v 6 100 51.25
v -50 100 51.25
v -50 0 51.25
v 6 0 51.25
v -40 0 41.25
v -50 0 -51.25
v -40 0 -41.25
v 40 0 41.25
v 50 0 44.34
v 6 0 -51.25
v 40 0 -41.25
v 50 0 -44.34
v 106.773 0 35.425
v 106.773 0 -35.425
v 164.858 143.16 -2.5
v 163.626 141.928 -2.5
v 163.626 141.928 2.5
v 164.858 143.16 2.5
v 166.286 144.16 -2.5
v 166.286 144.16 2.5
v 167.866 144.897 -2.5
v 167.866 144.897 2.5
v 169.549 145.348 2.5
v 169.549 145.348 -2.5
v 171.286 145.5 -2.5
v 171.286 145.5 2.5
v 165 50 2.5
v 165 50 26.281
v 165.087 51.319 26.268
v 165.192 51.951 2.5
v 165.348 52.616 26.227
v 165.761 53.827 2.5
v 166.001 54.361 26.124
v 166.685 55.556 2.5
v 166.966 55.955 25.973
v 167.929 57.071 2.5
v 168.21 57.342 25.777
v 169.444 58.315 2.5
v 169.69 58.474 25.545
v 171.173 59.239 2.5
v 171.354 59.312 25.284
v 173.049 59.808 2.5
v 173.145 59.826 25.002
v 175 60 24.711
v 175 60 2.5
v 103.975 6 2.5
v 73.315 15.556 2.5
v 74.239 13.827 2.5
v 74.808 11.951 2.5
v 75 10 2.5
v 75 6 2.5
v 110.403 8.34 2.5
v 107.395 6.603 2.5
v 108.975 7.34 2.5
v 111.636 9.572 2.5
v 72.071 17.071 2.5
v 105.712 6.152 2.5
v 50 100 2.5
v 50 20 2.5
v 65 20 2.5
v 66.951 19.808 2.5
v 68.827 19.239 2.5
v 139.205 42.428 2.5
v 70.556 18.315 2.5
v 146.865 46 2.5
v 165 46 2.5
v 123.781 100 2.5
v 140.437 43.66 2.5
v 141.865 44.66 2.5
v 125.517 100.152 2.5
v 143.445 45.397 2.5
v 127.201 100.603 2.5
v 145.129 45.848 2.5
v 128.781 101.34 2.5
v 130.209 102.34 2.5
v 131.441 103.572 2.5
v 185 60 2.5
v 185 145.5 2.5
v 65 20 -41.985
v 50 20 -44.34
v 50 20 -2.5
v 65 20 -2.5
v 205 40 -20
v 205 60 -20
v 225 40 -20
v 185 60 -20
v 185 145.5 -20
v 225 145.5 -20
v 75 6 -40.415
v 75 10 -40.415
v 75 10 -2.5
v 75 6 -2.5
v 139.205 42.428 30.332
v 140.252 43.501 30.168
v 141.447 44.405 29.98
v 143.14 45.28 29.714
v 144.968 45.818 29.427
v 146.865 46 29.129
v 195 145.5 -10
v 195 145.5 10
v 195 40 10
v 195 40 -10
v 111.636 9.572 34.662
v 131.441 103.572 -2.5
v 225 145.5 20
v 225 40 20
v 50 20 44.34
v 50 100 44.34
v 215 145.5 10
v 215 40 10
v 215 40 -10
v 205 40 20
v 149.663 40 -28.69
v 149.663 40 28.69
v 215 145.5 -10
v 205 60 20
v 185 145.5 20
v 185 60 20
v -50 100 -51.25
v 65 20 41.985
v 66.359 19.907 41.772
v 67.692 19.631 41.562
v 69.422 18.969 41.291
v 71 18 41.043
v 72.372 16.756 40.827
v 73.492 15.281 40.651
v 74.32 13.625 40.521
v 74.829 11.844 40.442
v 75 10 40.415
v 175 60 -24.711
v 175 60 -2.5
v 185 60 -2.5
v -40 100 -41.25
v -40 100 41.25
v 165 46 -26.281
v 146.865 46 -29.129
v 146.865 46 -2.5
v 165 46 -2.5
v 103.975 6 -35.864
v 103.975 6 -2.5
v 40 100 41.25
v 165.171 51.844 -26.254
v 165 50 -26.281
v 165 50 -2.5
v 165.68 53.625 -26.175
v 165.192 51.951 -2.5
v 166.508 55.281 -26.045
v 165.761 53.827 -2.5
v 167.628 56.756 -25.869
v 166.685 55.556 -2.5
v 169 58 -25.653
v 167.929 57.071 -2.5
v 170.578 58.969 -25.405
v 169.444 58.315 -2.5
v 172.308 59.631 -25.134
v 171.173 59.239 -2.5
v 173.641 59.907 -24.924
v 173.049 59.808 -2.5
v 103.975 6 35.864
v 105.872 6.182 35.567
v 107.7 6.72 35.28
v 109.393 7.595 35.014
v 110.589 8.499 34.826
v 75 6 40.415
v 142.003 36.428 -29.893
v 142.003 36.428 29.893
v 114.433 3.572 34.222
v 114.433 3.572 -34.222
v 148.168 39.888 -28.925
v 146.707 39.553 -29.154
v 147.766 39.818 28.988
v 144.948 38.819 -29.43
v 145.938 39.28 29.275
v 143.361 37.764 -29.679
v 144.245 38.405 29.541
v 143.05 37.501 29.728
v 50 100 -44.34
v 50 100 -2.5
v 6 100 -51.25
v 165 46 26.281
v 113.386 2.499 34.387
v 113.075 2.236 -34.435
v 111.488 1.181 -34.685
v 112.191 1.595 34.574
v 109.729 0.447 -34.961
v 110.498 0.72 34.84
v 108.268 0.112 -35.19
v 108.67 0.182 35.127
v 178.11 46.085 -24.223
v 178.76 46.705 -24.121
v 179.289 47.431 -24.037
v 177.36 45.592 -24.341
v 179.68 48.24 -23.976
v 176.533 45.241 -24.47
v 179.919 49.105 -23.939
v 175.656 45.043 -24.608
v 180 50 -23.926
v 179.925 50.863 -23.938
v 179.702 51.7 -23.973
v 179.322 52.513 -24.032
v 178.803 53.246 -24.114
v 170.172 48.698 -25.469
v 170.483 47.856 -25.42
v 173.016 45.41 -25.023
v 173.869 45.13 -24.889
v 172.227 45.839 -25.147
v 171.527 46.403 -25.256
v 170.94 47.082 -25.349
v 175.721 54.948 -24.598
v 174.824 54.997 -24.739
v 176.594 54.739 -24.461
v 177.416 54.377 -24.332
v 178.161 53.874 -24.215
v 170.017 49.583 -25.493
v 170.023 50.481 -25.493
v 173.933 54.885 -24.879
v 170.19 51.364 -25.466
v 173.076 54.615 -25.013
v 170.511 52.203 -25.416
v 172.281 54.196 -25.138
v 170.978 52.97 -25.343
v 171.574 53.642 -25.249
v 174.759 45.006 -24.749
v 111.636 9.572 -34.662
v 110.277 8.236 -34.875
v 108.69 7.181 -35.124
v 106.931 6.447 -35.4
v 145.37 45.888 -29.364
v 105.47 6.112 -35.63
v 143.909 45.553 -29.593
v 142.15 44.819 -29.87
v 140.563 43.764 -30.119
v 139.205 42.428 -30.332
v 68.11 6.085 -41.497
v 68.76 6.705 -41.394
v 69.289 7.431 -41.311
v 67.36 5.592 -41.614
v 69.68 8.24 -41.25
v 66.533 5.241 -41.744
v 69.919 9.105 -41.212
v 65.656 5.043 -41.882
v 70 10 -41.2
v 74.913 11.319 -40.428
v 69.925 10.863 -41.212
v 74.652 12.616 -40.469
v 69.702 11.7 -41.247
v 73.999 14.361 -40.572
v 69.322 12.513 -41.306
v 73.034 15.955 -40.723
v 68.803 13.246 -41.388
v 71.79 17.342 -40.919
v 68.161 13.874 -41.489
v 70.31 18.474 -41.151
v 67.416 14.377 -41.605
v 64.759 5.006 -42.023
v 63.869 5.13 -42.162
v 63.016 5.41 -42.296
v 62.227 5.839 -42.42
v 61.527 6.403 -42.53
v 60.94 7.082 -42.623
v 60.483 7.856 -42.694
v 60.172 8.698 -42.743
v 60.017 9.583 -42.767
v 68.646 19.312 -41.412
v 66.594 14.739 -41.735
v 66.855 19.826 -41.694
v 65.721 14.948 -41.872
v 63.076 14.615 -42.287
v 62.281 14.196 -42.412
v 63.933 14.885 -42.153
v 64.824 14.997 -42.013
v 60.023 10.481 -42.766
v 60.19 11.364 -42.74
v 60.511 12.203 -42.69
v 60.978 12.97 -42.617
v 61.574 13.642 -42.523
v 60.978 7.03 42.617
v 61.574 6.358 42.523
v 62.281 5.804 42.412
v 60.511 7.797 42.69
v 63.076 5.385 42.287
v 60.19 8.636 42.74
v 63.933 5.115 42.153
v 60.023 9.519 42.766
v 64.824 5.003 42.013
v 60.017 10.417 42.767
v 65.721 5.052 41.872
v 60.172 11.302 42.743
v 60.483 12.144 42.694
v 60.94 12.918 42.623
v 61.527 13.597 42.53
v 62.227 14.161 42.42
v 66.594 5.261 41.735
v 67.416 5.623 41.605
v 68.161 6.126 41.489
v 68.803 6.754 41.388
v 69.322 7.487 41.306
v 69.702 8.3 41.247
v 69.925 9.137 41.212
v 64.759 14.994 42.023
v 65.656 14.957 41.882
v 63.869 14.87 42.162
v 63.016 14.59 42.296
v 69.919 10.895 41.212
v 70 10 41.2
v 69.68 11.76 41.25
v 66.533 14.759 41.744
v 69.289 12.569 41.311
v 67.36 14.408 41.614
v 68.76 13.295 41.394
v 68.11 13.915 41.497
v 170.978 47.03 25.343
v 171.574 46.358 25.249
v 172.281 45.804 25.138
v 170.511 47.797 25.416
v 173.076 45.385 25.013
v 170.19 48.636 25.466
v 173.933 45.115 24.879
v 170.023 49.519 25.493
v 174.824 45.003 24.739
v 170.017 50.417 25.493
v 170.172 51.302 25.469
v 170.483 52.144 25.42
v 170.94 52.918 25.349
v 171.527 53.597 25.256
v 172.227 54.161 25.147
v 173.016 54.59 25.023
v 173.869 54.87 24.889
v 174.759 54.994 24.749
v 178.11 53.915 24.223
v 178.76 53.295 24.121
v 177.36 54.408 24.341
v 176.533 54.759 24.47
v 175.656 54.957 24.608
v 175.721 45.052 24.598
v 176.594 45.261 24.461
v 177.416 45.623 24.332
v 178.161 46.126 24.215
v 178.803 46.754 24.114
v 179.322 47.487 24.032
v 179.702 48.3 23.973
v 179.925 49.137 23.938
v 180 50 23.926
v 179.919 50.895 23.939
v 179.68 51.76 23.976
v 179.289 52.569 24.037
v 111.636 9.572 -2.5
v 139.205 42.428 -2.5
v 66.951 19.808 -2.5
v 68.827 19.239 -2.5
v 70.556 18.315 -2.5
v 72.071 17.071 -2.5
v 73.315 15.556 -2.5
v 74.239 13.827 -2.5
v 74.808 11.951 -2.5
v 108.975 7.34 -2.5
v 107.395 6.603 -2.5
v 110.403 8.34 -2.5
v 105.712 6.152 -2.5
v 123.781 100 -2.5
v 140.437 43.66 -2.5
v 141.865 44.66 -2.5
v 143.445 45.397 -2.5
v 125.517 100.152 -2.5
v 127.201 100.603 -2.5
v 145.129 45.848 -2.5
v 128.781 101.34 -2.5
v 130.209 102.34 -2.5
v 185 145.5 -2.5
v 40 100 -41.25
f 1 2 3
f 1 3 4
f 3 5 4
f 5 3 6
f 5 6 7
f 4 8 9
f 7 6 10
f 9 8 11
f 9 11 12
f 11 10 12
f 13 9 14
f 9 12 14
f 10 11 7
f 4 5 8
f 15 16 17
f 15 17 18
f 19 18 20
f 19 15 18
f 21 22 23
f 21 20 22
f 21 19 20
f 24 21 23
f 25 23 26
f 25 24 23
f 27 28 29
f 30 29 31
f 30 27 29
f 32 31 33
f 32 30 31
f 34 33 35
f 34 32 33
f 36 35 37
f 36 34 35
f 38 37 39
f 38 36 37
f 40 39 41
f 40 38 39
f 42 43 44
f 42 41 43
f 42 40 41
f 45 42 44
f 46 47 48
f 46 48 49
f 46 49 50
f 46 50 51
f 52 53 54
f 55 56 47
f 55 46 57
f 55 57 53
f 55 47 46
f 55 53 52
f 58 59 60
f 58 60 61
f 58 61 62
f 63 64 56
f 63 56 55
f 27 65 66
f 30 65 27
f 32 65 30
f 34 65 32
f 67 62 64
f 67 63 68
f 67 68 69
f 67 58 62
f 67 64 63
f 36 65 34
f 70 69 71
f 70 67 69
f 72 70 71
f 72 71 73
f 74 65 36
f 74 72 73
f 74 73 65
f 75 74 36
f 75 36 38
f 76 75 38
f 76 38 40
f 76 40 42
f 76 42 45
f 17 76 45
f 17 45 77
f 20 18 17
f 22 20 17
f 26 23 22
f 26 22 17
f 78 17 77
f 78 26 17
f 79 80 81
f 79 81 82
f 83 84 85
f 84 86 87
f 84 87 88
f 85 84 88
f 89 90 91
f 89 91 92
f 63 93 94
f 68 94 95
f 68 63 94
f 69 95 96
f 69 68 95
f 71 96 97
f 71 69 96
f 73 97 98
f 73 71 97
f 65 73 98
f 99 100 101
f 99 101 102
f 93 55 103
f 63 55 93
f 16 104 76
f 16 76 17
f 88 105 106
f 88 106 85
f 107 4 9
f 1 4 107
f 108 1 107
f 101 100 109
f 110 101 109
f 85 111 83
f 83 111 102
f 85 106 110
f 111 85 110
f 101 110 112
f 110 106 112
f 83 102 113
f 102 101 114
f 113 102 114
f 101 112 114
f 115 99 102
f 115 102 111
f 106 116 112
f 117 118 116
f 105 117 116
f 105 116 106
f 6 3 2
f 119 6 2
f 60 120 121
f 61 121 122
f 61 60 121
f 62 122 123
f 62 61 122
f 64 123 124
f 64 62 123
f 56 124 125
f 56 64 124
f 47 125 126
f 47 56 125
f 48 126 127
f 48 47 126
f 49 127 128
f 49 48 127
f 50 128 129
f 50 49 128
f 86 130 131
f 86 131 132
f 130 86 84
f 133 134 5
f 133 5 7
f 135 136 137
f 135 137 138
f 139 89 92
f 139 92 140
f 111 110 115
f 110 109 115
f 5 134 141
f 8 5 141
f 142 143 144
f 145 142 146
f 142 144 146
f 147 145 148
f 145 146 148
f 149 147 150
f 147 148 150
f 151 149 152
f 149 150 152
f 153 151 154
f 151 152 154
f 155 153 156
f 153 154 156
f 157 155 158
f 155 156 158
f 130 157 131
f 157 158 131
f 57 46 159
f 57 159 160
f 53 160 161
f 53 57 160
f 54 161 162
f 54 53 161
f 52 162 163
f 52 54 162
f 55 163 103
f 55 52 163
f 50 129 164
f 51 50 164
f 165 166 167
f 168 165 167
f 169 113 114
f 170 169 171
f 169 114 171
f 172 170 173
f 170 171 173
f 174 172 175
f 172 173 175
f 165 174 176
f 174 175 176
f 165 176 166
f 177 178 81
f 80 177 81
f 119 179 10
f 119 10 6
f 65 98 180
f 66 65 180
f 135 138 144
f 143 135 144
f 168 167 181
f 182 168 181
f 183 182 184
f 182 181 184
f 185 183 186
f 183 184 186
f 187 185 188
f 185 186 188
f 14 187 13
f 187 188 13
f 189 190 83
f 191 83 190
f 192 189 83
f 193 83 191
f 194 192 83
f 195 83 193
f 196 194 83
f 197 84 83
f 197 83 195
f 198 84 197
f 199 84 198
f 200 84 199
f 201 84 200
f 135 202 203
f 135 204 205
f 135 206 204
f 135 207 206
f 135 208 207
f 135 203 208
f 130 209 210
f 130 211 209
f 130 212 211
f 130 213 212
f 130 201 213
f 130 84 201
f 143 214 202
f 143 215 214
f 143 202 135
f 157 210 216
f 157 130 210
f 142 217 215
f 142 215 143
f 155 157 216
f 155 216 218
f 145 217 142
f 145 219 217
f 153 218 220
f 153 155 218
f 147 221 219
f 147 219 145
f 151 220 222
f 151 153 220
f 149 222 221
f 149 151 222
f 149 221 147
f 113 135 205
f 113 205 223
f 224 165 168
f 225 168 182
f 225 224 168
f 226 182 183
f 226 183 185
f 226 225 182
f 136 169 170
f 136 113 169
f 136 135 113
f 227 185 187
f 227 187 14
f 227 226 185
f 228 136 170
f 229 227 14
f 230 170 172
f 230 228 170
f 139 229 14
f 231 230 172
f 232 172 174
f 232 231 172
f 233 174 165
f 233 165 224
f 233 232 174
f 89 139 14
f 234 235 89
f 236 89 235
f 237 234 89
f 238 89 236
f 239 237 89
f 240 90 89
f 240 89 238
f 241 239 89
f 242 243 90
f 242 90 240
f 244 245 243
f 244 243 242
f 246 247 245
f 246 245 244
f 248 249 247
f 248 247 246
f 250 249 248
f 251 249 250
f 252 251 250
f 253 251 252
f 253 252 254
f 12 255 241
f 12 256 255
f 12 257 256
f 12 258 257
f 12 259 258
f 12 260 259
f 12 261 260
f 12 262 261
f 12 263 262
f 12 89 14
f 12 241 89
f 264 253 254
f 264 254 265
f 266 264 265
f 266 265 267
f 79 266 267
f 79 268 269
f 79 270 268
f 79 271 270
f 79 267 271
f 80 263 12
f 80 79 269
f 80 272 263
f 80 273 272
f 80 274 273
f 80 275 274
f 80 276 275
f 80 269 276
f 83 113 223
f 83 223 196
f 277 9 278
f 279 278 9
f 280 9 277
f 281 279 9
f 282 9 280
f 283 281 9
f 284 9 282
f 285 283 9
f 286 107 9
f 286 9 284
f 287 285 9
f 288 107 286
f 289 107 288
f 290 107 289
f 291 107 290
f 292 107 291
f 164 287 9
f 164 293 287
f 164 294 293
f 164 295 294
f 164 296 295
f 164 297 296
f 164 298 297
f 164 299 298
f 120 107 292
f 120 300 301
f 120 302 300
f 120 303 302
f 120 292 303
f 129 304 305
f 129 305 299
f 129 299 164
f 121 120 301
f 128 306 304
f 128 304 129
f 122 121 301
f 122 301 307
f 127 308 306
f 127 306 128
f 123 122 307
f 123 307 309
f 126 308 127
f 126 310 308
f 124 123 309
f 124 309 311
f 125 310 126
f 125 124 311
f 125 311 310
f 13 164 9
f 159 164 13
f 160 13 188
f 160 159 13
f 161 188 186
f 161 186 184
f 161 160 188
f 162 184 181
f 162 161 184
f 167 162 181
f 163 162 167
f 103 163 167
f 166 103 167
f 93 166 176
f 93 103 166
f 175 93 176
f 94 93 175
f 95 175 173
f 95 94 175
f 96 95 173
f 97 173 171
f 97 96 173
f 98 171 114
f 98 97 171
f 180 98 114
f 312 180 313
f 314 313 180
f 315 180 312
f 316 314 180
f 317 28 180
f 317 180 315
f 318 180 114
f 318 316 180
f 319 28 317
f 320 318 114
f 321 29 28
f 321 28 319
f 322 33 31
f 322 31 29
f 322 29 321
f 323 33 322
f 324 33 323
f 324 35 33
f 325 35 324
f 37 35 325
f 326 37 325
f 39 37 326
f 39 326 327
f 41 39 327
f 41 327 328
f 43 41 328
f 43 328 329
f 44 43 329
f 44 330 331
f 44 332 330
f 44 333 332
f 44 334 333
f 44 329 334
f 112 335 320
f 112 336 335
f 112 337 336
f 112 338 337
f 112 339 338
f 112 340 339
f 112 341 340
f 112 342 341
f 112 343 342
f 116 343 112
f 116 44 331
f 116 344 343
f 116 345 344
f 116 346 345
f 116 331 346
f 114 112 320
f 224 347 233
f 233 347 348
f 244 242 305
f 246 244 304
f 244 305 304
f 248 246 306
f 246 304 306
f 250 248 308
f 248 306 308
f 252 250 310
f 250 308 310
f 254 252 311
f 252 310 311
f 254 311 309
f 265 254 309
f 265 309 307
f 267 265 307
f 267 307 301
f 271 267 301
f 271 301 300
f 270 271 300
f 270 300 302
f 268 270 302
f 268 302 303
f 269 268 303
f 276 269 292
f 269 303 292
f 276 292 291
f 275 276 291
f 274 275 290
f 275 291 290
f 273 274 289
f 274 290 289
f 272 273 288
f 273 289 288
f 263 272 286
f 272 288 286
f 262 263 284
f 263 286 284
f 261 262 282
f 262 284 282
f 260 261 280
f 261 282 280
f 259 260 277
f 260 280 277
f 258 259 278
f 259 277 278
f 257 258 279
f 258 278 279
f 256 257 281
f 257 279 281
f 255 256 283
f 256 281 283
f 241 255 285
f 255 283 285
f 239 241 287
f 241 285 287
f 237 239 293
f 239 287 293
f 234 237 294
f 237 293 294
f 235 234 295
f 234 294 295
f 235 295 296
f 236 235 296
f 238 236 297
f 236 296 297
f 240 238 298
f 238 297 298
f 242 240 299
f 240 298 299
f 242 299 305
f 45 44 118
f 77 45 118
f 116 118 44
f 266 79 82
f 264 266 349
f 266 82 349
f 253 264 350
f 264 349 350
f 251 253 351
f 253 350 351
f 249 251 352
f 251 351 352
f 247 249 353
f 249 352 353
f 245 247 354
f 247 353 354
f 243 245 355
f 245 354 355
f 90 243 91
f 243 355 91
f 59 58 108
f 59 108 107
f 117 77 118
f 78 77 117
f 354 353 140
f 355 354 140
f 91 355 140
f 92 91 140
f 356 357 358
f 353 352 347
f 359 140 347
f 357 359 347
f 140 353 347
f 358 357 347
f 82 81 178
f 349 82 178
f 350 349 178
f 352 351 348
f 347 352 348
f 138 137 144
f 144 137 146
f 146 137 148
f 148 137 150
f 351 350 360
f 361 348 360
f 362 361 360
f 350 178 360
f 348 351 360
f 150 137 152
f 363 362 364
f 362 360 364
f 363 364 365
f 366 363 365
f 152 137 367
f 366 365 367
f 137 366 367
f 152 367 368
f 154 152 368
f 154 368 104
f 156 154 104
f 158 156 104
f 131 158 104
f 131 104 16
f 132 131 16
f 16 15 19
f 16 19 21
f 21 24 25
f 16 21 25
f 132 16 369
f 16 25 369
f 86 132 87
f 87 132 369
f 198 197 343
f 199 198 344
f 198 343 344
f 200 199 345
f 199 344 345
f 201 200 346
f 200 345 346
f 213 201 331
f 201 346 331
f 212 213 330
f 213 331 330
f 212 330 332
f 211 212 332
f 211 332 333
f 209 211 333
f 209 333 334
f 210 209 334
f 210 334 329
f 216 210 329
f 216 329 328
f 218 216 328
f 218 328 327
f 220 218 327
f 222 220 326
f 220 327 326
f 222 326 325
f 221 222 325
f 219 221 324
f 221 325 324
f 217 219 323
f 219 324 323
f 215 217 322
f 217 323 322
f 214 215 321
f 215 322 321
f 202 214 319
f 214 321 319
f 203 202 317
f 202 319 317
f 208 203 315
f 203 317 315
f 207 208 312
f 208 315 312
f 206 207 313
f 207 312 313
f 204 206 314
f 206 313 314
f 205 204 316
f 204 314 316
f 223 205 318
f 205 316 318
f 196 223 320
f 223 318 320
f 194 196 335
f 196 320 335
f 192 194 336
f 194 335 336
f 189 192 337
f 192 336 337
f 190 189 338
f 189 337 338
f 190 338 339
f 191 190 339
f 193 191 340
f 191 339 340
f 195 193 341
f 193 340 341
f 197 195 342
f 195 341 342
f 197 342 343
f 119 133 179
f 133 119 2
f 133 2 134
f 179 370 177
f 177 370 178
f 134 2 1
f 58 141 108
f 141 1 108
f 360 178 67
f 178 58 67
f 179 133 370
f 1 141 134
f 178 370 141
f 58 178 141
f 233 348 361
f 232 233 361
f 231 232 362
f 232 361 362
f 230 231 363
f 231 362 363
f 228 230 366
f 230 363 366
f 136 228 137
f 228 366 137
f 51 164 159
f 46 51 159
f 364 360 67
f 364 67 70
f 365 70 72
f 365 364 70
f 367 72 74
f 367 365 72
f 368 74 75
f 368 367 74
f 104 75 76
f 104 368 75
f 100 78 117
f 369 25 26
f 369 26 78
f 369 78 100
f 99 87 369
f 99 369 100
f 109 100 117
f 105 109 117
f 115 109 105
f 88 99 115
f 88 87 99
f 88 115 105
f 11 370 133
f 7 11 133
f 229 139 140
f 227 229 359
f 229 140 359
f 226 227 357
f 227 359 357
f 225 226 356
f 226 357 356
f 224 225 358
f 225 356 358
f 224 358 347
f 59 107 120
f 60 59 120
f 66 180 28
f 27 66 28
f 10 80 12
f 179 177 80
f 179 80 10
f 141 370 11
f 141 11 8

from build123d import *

# Parameters (mm, degrees)
ESQUISSE1_W                  = 50
ESQUISSE1_H                  = 100
BOSS_EXTRU_1_DEPTH           = 51.25
ESQUISSE2_W                  = 40
ESQUISSE2_H                  = 40
ESQUISSE2_W_2                = 20
ESQUISSE2_H_2                = 20
BOSS_EXTRU_2_DEPTH           = 45.5
BOSS_EXTRU_2_DEPTH_BACK      = 100
ESQUISSE2_3_W                = 40
ESQUISSE2_3_H                = 82.5
ENL_V_MAT_EXTRU_1_DEPTH      = 101
ENL_V_START                  = -2.5
ENL_V_MAT_EXTRU_3_DEPTH      = 49.75
ENL_V_START_2                = 2.5
ENL_V_MAT_EXTRU_4_DEPTH      = 49.75
ESQUISSE1_6_R                = 5
ENL_V_MAT_EXTRU_5_DEPTH      = 52.25
ENL_V_MAT_EXTRU_5_DEPTH_BACK = 52.25
ENL_V_START_3                = -20
ESQUISSE1_7_W                = 20
ESQUISSE1_7_H                = 85.5
ENL_V_MAT_EXTRU_6_DEPTH      = 31.25
ENL_V_START_4                = 20
ESQUISSE1_8_W                = 20
ESQUISSE1_8_H                = 85.5
ENL_V_MAT_EXTRU_7_DEPTH      = 31.25


with BuildPart() as part:
    # Esquisse1 → Boss.-Extru.1 (new body, symmetric)
    with BuildSketch(Plane.XY):
        with Locations((-25, 50)):
            Rectangle(ESQUISSE1_W, ESQUISSE1_H)
    extrude(amount=BOSS_EXTRU_1_DEPTH, both=True)

    # Esquisse2 → Boss.-Extru.2 (add, two sides)
    with BuildSketch(Plane(origin=(0, 100, 0), x_dir=(1, 0, 0), z_dir=(0, 1, 0))) as boss_extru_2_sk:
        Polygon((205, 20), (50, 44.340452261), (50, -44.340452261), (205, -20), (185, -20), (185, 20), align=None)
        Polygon((6, 51.25), (0, 51.25), (0, 41.25), (40, 41.25), (40, -41.25), (0, -41.25), (0, -51.25), (6, -51.25), (50, -44.340452261), (50, 44.340452261), align=None)
        with Locations((205, 0)):
            Rectangle(ESQUISSE2_W, ESQUISSE2_H)
        with Locations((205, 0)):
            Rectangle(ESQUISSE2_W_2, ESQUISSE2_H_2, mode=Mode.SUBTRACT)
    extrude(amount=BOSS_EXTRU_2_DEPTH)
    extrude(boss_extru_2_sk.sketch, amount=-BOSS_EXTRU_2_DEPTH_BACK)

    # Esquisse2_3 → Enl_v. mat.-Extru.1 (cut, through all)
    with BuildSketch(Plane(origin=(0, 100, 0), x_dir=(1, 0, 0), z_dir=(0, 1, 0))):
        with Locations((-20, 0)):
            Rectangle(ESQUISSE2_3_W, ESQUISSE2_3_H)
        with Locations((20, 0)):
            Rectangle(ESQUISSE2_3_W, ESQUISSE2_3_H)
    extrude(amount=-ENL_V_MAT_EXTRU_1_DEPTH, mode=Mode.SUBTRACT)

    # Esquisse1_4 → Enl_v. mat.-Extru.3 (cut, through all)
    with BuildSketch(Plane.XY.offset(ENL_V_START)):
        with BuildLine():
            Line((50, 100), (50, 20))
            Line((50, 20), (65, 20))
            ThreePointArc((65, 20), (72.071067812, 17.071067812), (75, 10))
            Line((75, 10), (75, 6))
            Line((75, 6), (103.975092222, 6))
            ThreePointArc((103.975092222, 6), (108.20127484, 6.93692213), (111.635536654, 9.572123903))
            Line((111.635536654, 9.572123903), (139.204786201, 42.427876097))
            ThreePointArc((139.204786201, 42.427876097), (142.639048015, 45.06307787), (146.865230633, 46))
            Line((146.865230633, 46), (165, 46))
            Line((165, 46), (165, 50))
            ThreePointArc((165, 50), (167.928932188, 57.071067812), (175, 60))
            Line((175, 60), (185, 60))
            Line((185, 60), (185, 145.5))
            Line((185, 145.5), (171.285964092, 145.5))
            ThreePointArc((171.285964092, 145.5), (167.059781475, 144.56307787), (163.625519661, 141.927876097))
            Line((163.625519661, 141.927876097), (131.441222142, 103.572123903))
            ThreePointArc((131.441222142, 103.572123903), (128.006960328, 100.93692213), (123.780777711, 100))
            Line((123.780777711, 100), (50, 100))
        make_face()
    extrude(amount=-ENL_V_MAT_EXTRU_3_DEPTH, mode=Mode.SUBTRACT)

    # Esquisse1_5 → Enl_v. mat.-Extru.4 (cut, through all)
    with BuildSketch(Plane.XY.offset(ENL_V_START_2)):
        with BuildLine():
            Line((50, 100), (50, 20))
            Line((50, 20), (65, 20))
            ThreePointArc((65, 20), (72.071067812, 17.071067812), (75, 10))
            Line((75, 10), (75, 6))
            Line((75, 6), (103.975092222, 6))
            ThreePointArc((103.975092222, 6), (108.20127484, 6.93692213), (111.635536654, 9.572123903))
            Line((111.635536654, 9.572123903), (139.204786201, 42.427876097))
            ThreePointArc((139.204786201, 42.427876097), (142.639048015, 45.06307787), (146.865230633, 46))
            Line((146.865230633, 46), (165, 46))
            Line((165, 46), (165, 50))
            ThreePointArc((165, 50), (167.928932188, 57.071067812), (175, 60))
            Line((175, 60), (185, 60))
            Line((185, 60), (185, 145.5))
            Line((185, 145.5), (171.285964092, 145.5))
            ThreePointArc((171.285964092, 145.5), (167.059781475, 144.56307787), (163.625519661, 141.927876097))
            Line((163.625519661, 141.927876097), (131.441222142, 103.572123903))
            ThreePointArc((131.441222142, 103.572123903), (128.006960328, 100.93692213), (123.780777711, 100))
            Line((123.780777711, 100), (50, 100))
        make_face()
    extrude(amount=ENL_V_MAT_EXTRU_4_DEPTH, mode=Mode.SUBTRACT)

    # Esquisse1_6 → Enl_v. mat.-Extru.5 (cut, two sides)
    with BuildSketch(Plane.XY) as enl_v_mat_extru_5_sk:
        with BuildLine():
            Line((0, 100), (50, 100))
            Line((50, 100), (123.780777711, 100))
            ThreePointArc((123.780777711, 100), (128.006960328, 100.93692213), (131.441222142, 103.572123903))
            Line((131.441222142, 103.572123903), (163.625519661, 141.927876097))
            ThreePointArc((163.625519661, 141.927876097), (167.059781475, 144.56307787), (171.285964092, 145.5))
            Line((171.285964092, 145.5), (0, 145.5))
            Line((0, 145.5), (0, 100))
        make_face()
        with BuildLine():
            ThreePointArc((114.433382603, 3.572123903), (110.999120789, 0.93692213), (106.772938171, 0))
            Line((106.772938171, 0), (225, 0))
            Line((225, 0), (225, 40))
            Line((225, 40), (205, 40))
            Line((205, 40), (149.663076582, 40))
            ThreePointArc((149.663076582, 40), (145.436893964, 39.06307787), (142.00263215, 36.427876097))
            Line((142.00263215, 36.427876097), (114.433382603, 3.572123903))
        make_face()
        with Locations((65, 10)):
            Circle(ESQUISSE1_6_R)
        with Locations((175, 50)):
            Circle(ESQUISSE1_6_R)
    extrude(amount=ENL_V_MAT_EXTRU_5_DEPTH, mode=Mode.SUBTRACT)
    extrude(enl_v_mat_extru_5_sk.sketch, amount=-ENL_V_MAT_EXTRU_5_DEPTH_BACK, mode=Mode.SUBTRACT)

    # Esquisse1_7 → Enl_v. mat.-Extru.6 (cut)
    with BuildSketch(Plane.XY.offset(ENL_V_START_3)):
        with Locations((195, 102.75)):
            Rectangle(ESQUISSE1_7_W, ESQUISSE1_7_H)
    extrude(amount=-ENL_V_MAT_EXTRU_6_DEPTH, mode=Mode.SUBTRACT)

    # Esquisse1_8 → Enl_v. mat.-Extru.7 (cut)
    with BuildSketch(Plane.XY.offset(ENL_V_START_4)):
        with Locations((195, 102.75)):
            Rectangle(ESQUISSE1_8_W, ESQUISSE1_8_H)
    extrude(amount=ENL_V_MAT_EXTRU_7_DEPTH, mode=Mode.SUBTRACT)


solid = part.part
